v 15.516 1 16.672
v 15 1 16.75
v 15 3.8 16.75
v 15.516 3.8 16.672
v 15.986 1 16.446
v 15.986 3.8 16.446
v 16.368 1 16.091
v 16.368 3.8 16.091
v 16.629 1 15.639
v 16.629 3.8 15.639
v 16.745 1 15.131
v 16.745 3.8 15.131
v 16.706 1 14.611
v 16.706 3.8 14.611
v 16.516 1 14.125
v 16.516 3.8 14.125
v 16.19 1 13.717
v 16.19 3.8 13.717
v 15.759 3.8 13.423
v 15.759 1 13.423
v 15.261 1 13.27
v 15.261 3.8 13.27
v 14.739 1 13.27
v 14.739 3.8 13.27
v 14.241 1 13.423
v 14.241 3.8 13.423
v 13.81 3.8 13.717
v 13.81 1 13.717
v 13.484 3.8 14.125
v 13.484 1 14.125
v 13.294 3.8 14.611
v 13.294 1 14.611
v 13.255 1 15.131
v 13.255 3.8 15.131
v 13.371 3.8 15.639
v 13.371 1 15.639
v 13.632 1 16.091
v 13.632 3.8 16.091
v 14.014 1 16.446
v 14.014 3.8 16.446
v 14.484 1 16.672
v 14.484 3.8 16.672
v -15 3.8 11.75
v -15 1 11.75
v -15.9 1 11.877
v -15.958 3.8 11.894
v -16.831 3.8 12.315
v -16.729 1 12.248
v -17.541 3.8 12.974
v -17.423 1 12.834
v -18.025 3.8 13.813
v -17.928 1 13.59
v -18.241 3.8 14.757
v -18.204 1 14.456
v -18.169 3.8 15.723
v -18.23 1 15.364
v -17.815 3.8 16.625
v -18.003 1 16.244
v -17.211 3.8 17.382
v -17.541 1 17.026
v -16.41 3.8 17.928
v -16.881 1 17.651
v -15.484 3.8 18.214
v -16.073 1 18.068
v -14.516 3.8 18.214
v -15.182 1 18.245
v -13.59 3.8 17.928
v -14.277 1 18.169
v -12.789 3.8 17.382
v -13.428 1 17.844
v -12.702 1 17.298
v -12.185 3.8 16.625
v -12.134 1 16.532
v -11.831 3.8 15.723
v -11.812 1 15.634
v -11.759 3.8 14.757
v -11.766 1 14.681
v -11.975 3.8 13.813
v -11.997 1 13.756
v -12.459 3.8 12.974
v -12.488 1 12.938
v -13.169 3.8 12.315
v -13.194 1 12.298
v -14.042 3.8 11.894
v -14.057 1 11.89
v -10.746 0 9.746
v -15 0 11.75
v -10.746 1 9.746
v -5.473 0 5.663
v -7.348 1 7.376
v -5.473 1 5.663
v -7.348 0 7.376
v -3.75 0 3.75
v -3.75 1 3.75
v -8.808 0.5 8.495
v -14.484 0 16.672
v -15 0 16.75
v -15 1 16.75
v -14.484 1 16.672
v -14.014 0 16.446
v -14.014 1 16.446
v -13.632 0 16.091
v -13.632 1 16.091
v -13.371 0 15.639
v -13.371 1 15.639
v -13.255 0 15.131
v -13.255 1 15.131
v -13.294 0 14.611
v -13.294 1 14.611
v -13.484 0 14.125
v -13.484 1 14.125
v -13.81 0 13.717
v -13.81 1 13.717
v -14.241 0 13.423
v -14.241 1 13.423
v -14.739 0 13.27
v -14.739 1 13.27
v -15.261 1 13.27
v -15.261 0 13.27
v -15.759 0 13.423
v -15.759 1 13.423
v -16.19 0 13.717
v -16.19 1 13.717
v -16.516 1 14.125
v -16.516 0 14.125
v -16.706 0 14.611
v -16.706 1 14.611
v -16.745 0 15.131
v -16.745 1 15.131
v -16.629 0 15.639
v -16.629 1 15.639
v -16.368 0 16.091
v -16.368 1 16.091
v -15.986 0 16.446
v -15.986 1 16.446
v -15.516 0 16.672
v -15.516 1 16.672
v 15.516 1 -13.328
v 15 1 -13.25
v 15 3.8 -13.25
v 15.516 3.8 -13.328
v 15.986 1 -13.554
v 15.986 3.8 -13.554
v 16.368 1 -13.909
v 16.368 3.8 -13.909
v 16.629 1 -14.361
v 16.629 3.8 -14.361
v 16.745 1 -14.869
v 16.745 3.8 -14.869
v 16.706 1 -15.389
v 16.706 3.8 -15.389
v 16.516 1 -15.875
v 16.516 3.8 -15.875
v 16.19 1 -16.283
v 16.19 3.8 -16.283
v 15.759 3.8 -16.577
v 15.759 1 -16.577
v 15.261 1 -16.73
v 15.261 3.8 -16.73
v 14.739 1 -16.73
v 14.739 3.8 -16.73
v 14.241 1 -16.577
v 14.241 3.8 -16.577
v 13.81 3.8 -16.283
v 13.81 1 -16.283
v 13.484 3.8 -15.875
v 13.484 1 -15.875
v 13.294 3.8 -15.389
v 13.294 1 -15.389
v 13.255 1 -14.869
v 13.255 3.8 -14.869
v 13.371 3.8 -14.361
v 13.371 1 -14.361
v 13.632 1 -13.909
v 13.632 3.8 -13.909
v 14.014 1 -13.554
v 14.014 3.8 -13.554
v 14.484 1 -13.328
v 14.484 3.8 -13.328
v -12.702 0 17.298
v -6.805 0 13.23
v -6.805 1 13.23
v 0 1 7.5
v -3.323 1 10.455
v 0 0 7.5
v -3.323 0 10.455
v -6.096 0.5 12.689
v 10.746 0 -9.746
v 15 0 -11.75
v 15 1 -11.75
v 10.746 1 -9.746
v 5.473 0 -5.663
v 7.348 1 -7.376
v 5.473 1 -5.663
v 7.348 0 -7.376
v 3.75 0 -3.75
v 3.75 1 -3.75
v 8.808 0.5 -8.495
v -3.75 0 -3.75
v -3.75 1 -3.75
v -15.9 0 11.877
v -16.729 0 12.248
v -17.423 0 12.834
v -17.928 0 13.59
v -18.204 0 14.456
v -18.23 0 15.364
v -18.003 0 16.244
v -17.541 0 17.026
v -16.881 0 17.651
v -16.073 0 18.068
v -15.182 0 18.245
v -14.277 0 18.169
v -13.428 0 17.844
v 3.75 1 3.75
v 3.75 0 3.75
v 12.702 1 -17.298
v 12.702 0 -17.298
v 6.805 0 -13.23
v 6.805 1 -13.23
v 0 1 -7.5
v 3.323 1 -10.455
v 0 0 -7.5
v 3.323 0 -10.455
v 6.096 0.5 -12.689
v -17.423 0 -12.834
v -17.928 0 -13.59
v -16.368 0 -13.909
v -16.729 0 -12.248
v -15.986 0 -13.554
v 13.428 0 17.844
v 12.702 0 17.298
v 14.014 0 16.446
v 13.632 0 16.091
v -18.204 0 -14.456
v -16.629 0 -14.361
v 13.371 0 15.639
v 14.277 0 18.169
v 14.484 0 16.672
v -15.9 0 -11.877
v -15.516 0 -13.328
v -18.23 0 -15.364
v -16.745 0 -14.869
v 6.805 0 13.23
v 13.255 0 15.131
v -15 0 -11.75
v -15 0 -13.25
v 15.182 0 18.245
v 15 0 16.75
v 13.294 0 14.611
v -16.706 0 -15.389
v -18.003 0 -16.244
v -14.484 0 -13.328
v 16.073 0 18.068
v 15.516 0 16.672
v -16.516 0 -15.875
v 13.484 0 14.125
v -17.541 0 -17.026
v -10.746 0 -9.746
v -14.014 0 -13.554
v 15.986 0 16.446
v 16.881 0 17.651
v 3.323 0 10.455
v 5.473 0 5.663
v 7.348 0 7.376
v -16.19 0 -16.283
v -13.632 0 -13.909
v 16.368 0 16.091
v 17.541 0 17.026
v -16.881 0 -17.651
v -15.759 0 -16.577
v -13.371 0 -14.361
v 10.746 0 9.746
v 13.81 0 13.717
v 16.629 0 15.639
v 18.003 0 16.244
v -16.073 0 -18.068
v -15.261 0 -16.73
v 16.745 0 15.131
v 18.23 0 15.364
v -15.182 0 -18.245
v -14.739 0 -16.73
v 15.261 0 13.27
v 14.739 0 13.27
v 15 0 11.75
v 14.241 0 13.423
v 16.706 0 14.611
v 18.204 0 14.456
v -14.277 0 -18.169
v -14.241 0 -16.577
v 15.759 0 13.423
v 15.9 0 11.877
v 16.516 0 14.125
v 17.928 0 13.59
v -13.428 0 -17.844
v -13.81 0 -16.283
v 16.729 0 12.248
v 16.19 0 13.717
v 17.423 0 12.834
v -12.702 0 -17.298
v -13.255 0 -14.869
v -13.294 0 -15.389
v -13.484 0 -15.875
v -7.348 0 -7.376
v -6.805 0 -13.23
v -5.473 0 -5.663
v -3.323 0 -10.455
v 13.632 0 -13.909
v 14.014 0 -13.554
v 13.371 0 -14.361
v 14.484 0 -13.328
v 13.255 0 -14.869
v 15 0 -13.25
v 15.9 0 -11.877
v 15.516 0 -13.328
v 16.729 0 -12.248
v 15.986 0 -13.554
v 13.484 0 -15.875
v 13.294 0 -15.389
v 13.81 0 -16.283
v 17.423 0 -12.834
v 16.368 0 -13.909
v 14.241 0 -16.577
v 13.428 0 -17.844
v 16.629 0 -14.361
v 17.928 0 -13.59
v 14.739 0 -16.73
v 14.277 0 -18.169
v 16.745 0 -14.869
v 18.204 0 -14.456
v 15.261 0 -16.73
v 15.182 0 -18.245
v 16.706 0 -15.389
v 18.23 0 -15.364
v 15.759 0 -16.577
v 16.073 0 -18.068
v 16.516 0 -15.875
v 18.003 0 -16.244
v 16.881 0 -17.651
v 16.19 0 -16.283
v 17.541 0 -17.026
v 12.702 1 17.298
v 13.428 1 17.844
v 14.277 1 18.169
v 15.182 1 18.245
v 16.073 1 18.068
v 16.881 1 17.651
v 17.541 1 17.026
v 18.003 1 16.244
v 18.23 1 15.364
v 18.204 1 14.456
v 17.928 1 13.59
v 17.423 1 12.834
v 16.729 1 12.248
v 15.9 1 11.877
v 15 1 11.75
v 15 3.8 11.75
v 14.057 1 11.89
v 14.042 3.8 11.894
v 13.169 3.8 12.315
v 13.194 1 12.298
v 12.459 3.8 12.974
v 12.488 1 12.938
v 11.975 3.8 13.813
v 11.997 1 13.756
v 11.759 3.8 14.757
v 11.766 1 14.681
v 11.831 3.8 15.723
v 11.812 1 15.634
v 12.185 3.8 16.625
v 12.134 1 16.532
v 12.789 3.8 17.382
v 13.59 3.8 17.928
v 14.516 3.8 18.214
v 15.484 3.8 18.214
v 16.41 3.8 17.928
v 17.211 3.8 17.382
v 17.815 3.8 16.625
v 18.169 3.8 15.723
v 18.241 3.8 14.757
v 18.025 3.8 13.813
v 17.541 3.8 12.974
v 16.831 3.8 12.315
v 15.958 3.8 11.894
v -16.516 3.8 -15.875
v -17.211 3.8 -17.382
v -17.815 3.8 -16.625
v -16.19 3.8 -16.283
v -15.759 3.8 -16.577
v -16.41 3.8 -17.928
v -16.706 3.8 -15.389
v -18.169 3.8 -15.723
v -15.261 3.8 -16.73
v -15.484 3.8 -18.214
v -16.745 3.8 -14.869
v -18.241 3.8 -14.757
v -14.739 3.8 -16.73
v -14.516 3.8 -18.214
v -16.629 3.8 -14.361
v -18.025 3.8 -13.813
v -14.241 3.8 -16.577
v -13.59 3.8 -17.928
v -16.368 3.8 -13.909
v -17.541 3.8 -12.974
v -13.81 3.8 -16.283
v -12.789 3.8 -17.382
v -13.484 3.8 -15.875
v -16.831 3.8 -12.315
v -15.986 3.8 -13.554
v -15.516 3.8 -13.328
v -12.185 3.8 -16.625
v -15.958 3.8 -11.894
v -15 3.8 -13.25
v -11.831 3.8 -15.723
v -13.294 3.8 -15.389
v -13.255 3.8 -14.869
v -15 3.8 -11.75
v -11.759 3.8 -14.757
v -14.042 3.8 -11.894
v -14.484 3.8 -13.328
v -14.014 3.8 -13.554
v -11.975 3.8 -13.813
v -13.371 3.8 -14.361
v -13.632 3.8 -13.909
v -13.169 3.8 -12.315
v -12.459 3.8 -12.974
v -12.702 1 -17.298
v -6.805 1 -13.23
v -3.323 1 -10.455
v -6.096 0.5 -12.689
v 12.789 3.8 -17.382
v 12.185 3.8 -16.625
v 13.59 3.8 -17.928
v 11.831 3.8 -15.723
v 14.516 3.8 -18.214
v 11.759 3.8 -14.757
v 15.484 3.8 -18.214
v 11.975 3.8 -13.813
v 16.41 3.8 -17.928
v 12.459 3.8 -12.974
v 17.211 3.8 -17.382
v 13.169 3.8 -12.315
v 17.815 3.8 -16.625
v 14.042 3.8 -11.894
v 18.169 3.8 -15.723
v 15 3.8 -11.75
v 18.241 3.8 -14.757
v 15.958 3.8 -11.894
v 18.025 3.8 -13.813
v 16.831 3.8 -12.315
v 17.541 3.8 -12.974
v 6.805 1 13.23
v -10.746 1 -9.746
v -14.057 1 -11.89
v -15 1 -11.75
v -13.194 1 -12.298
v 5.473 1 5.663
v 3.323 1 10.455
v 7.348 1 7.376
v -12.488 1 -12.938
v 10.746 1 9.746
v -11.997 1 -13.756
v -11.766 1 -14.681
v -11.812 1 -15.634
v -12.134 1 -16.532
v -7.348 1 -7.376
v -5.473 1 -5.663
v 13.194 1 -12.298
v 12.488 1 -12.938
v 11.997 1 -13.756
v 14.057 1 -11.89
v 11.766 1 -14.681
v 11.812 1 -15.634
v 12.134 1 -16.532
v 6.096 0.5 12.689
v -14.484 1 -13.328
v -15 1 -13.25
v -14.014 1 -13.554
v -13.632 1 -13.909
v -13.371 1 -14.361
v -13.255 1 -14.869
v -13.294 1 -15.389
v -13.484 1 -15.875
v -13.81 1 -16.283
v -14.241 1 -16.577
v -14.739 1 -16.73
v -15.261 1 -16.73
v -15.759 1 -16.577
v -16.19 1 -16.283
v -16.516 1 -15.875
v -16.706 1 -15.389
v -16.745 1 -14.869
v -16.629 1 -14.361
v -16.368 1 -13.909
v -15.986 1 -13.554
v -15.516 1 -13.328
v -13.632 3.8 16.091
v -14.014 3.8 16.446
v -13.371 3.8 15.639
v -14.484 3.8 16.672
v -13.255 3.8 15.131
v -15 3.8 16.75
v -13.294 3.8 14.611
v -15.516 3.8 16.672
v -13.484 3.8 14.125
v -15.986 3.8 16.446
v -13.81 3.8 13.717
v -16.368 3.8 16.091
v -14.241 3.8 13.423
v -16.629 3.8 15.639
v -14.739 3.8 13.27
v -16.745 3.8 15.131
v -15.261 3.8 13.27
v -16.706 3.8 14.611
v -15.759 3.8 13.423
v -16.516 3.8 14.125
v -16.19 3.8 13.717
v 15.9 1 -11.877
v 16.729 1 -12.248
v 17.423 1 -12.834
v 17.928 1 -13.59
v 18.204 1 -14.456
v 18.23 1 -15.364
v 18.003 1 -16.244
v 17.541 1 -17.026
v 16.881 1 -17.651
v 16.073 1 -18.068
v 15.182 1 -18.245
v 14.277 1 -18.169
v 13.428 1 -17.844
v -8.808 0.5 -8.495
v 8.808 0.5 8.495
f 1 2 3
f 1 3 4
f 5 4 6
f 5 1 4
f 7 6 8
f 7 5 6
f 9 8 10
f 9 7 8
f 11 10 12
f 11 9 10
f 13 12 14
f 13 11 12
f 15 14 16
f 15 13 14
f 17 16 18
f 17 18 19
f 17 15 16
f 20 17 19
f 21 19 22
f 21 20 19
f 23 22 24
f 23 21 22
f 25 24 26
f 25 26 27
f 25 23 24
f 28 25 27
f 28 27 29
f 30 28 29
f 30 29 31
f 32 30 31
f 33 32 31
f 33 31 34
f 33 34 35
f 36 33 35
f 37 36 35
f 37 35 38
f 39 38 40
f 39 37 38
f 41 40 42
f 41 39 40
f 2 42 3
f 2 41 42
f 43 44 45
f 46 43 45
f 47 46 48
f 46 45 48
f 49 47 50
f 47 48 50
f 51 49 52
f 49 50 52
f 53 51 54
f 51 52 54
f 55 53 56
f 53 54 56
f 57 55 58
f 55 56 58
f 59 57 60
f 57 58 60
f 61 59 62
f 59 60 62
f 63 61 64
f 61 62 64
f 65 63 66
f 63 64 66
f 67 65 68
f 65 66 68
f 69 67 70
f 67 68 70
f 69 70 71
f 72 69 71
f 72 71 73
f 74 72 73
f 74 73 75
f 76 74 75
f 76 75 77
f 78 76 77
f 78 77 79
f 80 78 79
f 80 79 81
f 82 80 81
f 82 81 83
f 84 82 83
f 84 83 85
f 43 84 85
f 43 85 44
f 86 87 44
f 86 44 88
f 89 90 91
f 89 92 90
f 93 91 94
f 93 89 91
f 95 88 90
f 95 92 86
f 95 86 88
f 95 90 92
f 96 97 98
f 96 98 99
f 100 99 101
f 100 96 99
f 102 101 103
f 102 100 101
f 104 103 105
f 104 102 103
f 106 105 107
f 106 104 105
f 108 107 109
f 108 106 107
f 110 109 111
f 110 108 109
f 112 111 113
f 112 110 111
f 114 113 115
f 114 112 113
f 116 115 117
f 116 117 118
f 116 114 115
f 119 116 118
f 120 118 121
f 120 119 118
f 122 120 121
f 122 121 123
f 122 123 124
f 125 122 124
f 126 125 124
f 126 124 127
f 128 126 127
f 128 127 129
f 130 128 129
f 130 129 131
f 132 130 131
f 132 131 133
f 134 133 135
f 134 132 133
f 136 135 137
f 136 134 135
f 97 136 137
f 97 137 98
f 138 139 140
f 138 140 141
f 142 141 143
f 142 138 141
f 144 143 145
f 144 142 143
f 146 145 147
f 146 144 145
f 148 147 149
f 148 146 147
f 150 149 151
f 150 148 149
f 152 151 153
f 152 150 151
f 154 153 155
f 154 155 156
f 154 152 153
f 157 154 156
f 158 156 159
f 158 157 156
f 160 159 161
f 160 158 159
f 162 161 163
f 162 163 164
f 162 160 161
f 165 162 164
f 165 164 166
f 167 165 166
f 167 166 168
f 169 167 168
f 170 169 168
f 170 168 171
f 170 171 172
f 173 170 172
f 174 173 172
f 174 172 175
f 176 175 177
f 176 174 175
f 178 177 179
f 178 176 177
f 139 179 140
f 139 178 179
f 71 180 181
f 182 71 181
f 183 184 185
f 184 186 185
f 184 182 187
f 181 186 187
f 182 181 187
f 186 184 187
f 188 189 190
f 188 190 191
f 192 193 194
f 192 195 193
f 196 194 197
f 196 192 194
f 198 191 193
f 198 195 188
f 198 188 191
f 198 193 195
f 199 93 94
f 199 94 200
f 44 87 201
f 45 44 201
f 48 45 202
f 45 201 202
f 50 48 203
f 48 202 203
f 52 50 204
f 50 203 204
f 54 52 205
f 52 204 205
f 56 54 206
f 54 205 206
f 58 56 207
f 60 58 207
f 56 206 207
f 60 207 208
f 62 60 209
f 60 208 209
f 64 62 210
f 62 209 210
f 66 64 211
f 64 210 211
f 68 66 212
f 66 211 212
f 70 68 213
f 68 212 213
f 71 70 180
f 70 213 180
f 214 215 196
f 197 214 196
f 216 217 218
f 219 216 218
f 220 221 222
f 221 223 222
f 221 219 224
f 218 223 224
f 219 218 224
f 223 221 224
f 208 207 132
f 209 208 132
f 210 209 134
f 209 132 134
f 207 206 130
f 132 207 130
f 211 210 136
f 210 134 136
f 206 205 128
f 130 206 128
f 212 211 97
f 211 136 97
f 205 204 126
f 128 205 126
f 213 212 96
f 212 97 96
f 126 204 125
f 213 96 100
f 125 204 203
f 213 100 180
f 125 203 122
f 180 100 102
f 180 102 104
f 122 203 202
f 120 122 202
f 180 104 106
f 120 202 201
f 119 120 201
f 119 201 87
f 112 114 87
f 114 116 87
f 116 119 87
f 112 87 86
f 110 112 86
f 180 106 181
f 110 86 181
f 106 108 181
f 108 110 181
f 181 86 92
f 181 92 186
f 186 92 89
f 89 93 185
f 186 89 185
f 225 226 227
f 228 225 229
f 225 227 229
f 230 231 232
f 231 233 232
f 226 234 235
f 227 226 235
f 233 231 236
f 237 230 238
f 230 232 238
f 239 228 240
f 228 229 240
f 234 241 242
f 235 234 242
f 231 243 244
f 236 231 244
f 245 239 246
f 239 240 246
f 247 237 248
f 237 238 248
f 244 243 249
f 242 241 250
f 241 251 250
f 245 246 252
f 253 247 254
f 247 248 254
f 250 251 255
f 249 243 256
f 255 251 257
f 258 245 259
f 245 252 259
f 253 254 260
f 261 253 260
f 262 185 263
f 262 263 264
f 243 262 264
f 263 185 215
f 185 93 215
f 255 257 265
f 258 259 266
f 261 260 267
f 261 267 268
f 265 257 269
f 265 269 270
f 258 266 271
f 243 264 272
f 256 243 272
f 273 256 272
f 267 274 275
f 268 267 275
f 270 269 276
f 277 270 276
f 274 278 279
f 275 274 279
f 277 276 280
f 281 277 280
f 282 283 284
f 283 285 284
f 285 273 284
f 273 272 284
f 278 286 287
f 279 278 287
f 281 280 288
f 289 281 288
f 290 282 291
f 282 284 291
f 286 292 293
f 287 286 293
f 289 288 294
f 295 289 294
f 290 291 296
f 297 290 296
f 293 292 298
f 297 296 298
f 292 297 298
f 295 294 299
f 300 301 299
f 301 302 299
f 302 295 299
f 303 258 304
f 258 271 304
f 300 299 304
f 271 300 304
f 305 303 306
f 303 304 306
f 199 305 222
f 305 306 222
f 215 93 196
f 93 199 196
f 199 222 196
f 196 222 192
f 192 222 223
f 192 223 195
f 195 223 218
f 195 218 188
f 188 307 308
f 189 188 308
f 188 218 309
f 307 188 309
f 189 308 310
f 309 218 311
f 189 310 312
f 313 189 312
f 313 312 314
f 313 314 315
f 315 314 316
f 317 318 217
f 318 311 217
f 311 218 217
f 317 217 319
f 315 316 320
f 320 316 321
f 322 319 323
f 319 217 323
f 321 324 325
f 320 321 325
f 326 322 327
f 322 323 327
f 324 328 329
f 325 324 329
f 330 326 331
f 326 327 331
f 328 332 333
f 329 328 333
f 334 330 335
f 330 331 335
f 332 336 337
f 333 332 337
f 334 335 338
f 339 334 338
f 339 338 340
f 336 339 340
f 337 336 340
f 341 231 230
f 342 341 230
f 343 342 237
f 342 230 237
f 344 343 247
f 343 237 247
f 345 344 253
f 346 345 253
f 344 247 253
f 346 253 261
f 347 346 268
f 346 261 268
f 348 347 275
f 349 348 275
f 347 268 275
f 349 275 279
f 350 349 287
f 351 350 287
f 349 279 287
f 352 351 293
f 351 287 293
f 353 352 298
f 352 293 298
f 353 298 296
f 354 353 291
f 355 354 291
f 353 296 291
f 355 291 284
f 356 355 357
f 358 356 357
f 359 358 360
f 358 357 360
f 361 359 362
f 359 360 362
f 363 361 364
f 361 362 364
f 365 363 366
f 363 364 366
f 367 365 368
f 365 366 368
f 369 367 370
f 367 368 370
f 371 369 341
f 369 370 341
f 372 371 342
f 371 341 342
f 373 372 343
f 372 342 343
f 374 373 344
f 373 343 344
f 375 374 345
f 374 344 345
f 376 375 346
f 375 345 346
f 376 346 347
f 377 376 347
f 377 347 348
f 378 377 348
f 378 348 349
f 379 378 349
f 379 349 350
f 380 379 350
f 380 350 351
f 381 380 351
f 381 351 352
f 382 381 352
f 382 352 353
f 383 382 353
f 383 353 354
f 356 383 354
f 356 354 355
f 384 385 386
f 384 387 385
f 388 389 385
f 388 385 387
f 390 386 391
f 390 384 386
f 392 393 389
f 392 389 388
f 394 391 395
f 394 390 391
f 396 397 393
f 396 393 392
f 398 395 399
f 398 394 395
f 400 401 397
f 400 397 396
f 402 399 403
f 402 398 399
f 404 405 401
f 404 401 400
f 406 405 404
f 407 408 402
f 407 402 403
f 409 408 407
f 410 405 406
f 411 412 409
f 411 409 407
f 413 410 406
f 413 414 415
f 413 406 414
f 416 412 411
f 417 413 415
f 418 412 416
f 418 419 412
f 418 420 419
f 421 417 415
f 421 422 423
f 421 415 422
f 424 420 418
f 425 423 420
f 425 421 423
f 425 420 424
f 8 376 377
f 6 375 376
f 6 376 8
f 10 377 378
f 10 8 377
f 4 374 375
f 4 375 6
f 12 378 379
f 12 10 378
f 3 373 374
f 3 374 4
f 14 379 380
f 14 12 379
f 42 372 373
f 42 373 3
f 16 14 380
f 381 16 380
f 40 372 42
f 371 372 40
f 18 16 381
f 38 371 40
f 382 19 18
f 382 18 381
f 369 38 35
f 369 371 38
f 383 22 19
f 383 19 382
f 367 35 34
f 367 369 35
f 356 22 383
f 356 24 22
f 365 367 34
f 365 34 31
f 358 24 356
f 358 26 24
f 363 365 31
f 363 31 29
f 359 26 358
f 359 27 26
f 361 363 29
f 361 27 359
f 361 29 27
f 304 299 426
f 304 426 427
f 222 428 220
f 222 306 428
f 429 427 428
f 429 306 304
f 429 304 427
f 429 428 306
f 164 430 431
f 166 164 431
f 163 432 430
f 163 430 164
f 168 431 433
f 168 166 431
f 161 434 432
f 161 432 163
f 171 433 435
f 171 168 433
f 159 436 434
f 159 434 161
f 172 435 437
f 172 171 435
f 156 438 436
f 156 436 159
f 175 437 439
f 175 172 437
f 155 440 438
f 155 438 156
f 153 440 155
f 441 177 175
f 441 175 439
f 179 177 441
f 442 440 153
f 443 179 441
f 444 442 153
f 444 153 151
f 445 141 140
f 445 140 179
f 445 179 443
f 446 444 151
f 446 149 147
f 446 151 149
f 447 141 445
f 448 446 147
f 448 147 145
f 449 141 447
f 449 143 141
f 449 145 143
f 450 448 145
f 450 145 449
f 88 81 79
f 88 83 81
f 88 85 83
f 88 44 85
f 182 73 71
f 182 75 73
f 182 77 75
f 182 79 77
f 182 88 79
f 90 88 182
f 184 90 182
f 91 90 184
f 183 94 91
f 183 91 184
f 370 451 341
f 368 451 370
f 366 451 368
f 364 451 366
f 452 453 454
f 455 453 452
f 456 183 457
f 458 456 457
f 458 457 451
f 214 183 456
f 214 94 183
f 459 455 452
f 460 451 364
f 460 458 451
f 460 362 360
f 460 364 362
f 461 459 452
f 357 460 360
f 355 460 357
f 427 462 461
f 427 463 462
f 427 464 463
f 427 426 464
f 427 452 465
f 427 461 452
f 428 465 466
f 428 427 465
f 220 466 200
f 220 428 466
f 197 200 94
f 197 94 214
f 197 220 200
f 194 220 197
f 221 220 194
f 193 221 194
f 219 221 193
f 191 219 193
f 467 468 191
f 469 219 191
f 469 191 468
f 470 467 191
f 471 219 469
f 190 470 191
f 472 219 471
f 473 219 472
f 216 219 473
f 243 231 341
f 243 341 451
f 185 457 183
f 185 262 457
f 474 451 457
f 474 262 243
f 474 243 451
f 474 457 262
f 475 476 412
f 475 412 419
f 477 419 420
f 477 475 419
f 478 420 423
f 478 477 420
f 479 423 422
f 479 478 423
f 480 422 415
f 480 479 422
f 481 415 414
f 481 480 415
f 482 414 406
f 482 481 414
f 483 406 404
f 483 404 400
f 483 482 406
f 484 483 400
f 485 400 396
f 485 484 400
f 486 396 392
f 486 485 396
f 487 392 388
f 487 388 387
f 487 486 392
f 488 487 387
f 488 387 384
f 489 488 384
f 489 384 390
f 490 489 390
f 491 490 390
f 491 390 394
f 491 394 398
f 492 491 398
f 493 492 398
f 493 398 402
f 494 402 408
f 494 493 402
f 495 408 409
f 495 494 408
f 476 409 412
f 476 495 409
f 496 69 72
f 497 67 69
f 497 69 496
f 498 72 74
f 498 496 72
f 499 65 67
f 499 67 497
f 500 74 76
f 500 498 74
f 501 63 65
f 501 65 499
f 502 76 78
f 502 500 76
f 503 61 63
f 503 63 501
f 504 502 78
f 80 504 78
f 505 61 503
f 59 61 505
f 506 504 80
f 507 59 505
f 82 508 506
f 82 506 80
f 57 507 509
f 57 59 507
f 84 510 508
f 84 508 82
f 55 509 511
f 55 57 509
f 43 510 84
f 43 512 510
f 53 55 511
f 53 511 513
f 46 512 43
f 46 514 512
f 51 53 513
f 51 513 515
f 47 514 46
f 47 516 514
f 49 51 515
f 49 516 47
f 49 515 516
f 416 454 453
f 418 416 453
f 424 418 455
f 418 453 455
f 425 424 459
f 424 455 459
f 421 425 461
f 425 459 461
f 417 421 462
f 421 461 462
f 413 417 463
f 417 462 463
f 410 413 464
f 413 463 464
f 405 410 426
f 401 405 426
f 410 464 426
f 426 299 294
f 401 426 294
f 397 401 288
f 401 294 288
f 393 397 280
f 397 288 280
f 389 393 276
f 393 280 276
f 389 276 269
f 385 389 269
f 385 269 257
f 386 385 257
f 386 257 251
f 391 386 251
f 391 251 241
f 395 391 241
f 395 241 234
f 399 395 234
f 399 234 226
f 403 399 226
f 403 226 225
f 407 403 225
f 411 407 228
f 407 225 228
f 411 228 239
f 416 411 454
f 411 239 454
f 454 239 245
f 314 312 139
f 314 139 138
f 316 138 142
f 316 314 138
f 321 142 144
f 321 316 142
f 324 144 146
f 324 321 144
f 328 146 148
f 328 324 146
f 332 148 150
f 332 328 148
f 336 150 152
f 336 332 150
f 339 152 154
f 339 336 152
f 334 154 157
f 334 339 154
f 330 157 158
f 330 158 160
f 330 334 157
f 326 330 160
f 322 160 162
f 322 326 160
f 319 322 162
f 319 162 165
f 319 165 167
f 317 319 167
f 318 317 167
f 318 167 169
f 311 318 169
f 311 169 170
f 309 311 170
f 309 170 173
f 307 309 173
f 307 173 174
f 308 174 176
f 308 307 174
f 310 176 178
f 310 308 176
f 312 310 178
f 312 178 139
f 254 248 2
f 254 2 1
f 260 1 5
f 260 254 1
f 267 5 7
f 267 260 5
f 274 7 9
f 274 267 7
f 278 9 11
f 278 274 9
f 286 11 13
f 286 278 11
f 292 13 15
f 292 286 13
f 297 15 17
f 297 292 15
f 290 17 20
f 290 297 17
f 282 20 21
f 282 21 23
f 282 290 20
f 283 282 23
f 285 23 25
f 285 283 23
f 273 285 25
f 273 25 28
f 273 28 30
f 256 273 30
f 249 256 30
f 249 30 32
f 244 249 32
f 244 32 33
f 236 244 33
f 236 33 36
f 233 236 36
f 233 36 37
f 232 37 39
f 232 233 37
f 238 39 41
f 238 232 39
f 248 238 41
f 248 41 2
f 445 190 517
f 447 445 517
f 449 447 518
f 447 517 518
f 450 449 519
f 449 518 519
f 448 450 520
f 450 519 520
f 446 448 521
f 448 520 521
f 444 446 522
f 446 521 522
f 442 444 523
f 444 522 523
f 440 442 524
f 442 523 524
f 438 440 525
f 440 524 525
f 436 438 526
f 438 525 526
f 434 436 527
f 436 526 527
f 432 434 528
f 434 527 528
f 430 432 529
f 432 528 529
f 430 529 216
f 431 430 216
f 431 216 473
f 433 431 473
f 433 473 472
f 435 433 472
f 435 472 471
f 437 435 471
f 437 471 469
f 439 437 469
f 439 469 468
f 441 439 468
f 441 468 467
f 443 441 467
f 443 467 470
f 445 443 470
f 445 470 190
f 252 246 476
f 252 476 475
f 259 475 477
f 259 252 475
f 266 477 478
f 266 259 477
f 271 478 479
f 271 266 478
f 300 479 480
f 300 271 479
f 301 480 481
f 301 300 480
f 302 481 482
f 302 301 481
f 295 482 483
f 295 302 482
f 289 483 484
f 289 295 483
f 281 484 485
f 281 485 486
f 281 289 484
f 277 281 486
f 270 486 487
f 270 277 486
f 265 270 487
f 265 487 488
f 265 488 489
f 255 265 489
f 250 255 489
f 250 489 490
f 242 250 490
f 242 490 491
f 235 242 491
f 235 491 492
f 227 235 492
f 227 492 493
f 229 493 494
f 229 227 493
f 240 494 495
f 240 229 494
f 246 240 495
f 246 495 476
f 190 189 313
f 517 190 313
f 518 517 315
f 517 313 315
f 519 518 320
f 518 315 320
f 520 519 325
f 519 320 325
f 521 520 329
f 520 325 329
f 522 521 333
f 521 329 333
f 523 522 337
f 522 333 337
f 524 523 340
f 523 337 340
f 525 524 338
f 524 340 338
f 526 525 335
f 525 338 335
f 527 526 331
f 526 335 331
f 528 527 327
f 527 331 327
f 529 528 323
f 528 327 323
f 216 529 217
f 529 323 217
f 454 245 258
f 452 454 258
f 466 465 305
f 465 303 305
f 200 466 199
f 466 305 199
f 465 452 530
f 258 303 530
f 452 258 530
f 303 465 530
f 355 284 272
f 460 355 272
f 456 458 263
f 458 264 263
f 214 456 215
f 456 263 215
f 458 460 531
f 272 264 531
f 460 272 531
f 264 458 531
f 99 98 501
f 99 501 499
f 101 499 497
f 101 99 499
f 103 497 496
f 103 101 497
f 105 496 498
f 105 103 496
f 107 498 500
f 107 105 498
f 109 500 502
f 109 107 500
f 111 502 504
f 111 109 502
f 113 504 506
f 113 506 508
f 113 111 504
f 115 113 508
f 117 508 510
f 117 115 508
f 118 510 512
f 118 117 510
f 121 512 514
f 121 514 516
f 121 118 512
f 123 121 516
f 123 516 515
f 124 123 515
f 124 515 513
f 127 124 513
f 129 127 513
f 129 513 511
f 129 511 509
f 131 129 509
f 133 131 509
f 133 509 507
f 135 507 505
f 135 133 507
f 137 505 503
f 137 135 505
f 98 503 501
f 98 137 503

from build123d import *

# Parameters (mm, degrees)
SKETCH1_R           = 3.25
SKETCH1_R_2         = 1.75
SKETCH1_W           = 7.5
SKETCH1_H           = 7.5
BOSS_EXTRUDE1_DEPTH = 1
SKETCH2_R           = 3.25
SKETCH2_R_2         = 1.75
BOSS_EXTRUDE2_DEPTH = 2.8


with BuildPart() as part:
    # Sketch1 → Boss-Extrude1 (new body)
    # profile 1 of 11: a face of its own
    with BuildSketch(Plane(origin=(0, 0, 0), x_dir=(1, 0, 0), z_dir=(0, 1, 0))):
        with Locations((-15, -15)):
            Circle(SKETCH1_R)
        with Locations(Location((-15, -15, 0), (0, 0, 270))):
            Circle(SKETCH1_R_2, mode=Mode.SUBTRACT)
    # profile 2 of 11: a face of its own
    with BuildSketch(Plane(origin=(0, 0, 0), x_dir=(1, 0, 0), z_dir=(0, 1, 0))):
        with BuildLine():
            add(Edge.make_bspline(
                [(0, -7.5), (-1.930795648, -5.688459272), (-3.75, -3.75)],
                knots=[0.751545437, 0.751545437, 0.751545437, 1, 1, 1], degree=2))
            add(Edge.make_bspline(
                [(-15, -11.75), (-8.240801632, -9.240499337), (-3.75, -3.75)],
                knots=[0, 0, 0, 1, 1, 1], degree=2))
            ThreePointArc((-15, -11.75), (-12.701902961, -12.701902961), (-11.75, -15))
            ThreePointArc((-11.75, -15), (-11.997391519, -16.243721155), (-12.701902961, -17.298097039))
            add(Edge.make_bspline(
                [(-12.701902961, -17.298097039), (-5.840426668, -12.979694751), (0, -7.5)],
                knots=[0, 0, 0, 0.751545437, 0.751545437, 0.751545437], degree=2))
        make_face()
    # profile 3 of 11: a face of its own
    with BuildSketch(Plane(origin=(0, 0, 0), x_dir=(1, 0, 0), z_dir=(0, 1, 0))):
        with BuildLine():
            add(Edge.make_bspline(
                [(0, -7.5), (1.930795648, -5.688459272), (3.75, -3.75)],
                knots=[0.751545437, 0.751545437, 0.751545437, 1, 1, 1], degree=2))
            Line((3.75, -3.75), (-3.75, -3.75))
            add(Edge.make_bspline(
                [(0, -7.5), (-1.930795648, -5.688459272), (-3.75, -3.75)],
                knots=[0.751545437, 0.751545437, 0.751545437, 1, 1, 1], degree=2))
        make_face()
    # profile 4 of 11: a face of its own
    with BuildSketch(Plane(origin=(0, 0, 0), x_dir=(1, 0, 0), z_dir=(0, 1, 0))):
        Rectangle(SKETCH1_W, SKETCH1_H)
    # profile 5 of 11: a face of its own
    with BuildSketch(Plane(origin=(0, 0, 0), x_dir=(1, 0, 0), z_dir=(0, 1, 0))):
        with BuildLine():
            add(Edge.make_bspline(
                [(15, -11.75), (8.240801632, -9.240499337), (3.75, -3.75)],
                knots=[0, 0, 0, 1, 1, 1], degree=2))
            add(Edge.make_bspline(
                [(0, -7.5), (1.930795648, -5.688459272), (3.75, -3.75)],
                knots=[0.751545437, 0.751545437, 0.751545437, 1, 1, 1], degree=2))
            add(Edge.make_bspline(
                [(12.701902961, -17.298097039), (5.840426668, -12.979694751), (0, -7.5)],
                knots=[0, 0, 0, 0.751545437, 0.751545437, 0.751545437], degree=2))
            ThreePointArc((12.701902961, -17.298097039), (11.997391519, -13.756278845), (15, -11.75))
        make_face()
    # profile 6 of 11: a face of its own
    with BuildSketch(Plane(origin=(0, 0, 0), x_dir=(1, 0, 0), z_dir=(0, 1, 0))):
        with Locations((15, -15)):
            Circle(SKETCH1_R)
        with Locations(Location((15, -15, 0), (0, 0, 270))):
            Circle(SKETCH1_R_2, mode=Mode.SUBTRACT)
    # profile 7 of 11: a face of its own
    with BuildSketch(Plane(origin=(0, 0, 0), x_dir=(1, 0, 0), z_dir=(0, 1, 0))):
        with BuildLine():
            add(Edge.make_bspline(
                [(0, 7.5), (1.930795648, 5.688459272), (3.75, 3.75)],
                knots=[0.751545437, 0.751545437, 0.751545437, 1, 1, 1], degree=2))
            add(Edge.make_bspline(
                [(15, 11.75), (8.240801632, 9.240499337), (3.75, 3.75)],
                knots=[0, 0, 0, 1, 1, 1], degree=2))
            ThreePointArc((15, 11.75), (11.997391519, 13.756278845), (12.701902961, 17.298097039))
            add(Edge.make_bspline(
                [(12.701902961, 17.298097039), (5.840426668, 12.979694751), (0, 7.5)],
                knots=[0, 0, 0, 0.751545437, 0.751545437, 0.751545437], degree=2))
        make_face()
    # profile 8 of 11: a face of its own
    with BuildSketch(Plane(origin=(0, 0, 0), x_dir=(1, 0, 0), z_dir=(0, 1, 0))):
        with Locations((15, 15)):
            Circle(SKETCH1_R)
        with Locations(Location((15, 15, 0), (0, 0, 270))):
            Circle(SKETCH1_R_2, mode=Mode.SUBTRACT)
    # profile 9 of 11: a face of its own
    with BuildSketch(Plane(origin=(0, 0, 0), x_dir=(1, 0, 0), z_dir=(0, 1, 0))):
        with BuildLine():
            Line((-3.75, 3.75), (3.75, 3.75))
            add(Edge.make_bspline(
                [(0, 7.5), (1.930795648, 5.688459272), (3.75, 3.75)],
                knots=[0.751545437, 0.751545437, 0.751545437, 1, 1, 1], degree=2))
            add(Edge.make_bspline(
                [(0, 7.5), (-1.930795648, 5.688459272), (-3.75, 3.75)],
                knots=[0.751545437, 0.751545437, 0.751545437, 1, 1, 1], degree=2))
        make_face()
    # profile 10 of 11: a face of its own
    with BuildSketch(Plane(origin=(0, 0, 0), x_dir=(1, 0, 0), z_dir=(0, 1, 0))):
        with BuildLine():
            add(Edge.make_bspline(
                [(-15, 11.75), (-8.240801632, 9.240499337), (-3.75, 3.75)],
                knots=[0, 0, 0, 1, 1, 1], degree=2))
            add(Edge.make_bspline(
                [(0, 7.5), (-1.930795648, 5.688459272), (-3.75, 3.75)],
                knots=[0.751545437, 0.751545437, 0.751545437, 1, 1, 1], degree=2))
            add(Edge.make_bspline(
                [(-12.701902961, 17.298097039), (-5.840426668, 12.979694751), (0, 7.5)],
                knots=[0, 0, 0, 0.751545437, 0.751545437, 0.751545437], degree=2))
            ThreePointArc((-12.701902961, 17.298097039), (-11.997391519, 16.243721155), (-11.75, 15))
            ThreePointArc((-11.75, 15), (-12.701902961, 12.701902961), (-15, 11.75))
        make_face()
    # profile 11 of 11: a face of its own
    with BuildSketch(Plane(origin=(0, 0, 0), x_dir=(1, 0, 0), z_dir=(0, 1, 0))):
        with Locations((-15, 15)):
            Circle(SKETCH1_R)
        with Locations(Location((-15, 15, 0), (0, 0, 270))):
            Circle(SKETCH1_R_2, mode=Mode.SUBTRACT)
    extrude(amount=BOSS_EXTRUDE1_DEPTH)

    # Sketch2 → Boss-Extrude2 (add)
    # profile 1 of 4: a face of its own
    with BuildSketch(Plane(origin=(0, 1, 0), x_dir=(1, 0, 0), z_dir=(0, 1, 0))):
        with Locations(Location((-15, 15, 0), (0, 0, 270))):
            Circle(SKETCH2_R)
        with Locations(Location((-15, 15, 0), (0, 0, 270))):
            Circle(SKETCH2_R_2, mode=Mode.SUBTRACT)
    # profile 2 of 4: a face of its own
    with BuildSketch(Plane(origin=(0, 1, 0), x_dir=(1, 0, 0), z_dir=(0, 1, 0))):
        with Locations(Location((15, 15, 0), (0, 0, 270))):
            Circle(SKETCH2_R)
        with Locations(Location((15, 15, 0), (0, 0, 270))):
            Circle(SKETCH2_R_2, mode=Mode.SUBTRACT)
    # profile 3 of 4: a face of its own
    with BuildSketch(Plane(origin=(0, 1, 0), x_dir=(1, 0, 0), z_dir=(0, 1, 0))):
        with Locations(Location((15, -15, 0), (0, 0, 90))):
            Circle(SKETCH2_R)
        with Locations(Location((15, -15, 0), (0, 0, 270))):
            Circle(SKETCH2_R_2, mode=Mode.SUBTRACT)
    # profile 4 of 4: a face of its own
    with BuildSketch(Plane(origin=(0, 1, 0), x_dir=(1, 0, 0), z_dir=(0, 1, 0))):
        with Locations(Location((-15, -15, 0), (0, 0, 90))):
            Circle(SKETCH2_R)
        with Locations(Location((-15, -15, 0), (0, 0, 270))):
            Circle(SKETCH2_R_2, mode=Mode.SUBTRACT)
    extrude(amount=BOSS_EXTRUDE2_DEPTH)


solid = part.part
